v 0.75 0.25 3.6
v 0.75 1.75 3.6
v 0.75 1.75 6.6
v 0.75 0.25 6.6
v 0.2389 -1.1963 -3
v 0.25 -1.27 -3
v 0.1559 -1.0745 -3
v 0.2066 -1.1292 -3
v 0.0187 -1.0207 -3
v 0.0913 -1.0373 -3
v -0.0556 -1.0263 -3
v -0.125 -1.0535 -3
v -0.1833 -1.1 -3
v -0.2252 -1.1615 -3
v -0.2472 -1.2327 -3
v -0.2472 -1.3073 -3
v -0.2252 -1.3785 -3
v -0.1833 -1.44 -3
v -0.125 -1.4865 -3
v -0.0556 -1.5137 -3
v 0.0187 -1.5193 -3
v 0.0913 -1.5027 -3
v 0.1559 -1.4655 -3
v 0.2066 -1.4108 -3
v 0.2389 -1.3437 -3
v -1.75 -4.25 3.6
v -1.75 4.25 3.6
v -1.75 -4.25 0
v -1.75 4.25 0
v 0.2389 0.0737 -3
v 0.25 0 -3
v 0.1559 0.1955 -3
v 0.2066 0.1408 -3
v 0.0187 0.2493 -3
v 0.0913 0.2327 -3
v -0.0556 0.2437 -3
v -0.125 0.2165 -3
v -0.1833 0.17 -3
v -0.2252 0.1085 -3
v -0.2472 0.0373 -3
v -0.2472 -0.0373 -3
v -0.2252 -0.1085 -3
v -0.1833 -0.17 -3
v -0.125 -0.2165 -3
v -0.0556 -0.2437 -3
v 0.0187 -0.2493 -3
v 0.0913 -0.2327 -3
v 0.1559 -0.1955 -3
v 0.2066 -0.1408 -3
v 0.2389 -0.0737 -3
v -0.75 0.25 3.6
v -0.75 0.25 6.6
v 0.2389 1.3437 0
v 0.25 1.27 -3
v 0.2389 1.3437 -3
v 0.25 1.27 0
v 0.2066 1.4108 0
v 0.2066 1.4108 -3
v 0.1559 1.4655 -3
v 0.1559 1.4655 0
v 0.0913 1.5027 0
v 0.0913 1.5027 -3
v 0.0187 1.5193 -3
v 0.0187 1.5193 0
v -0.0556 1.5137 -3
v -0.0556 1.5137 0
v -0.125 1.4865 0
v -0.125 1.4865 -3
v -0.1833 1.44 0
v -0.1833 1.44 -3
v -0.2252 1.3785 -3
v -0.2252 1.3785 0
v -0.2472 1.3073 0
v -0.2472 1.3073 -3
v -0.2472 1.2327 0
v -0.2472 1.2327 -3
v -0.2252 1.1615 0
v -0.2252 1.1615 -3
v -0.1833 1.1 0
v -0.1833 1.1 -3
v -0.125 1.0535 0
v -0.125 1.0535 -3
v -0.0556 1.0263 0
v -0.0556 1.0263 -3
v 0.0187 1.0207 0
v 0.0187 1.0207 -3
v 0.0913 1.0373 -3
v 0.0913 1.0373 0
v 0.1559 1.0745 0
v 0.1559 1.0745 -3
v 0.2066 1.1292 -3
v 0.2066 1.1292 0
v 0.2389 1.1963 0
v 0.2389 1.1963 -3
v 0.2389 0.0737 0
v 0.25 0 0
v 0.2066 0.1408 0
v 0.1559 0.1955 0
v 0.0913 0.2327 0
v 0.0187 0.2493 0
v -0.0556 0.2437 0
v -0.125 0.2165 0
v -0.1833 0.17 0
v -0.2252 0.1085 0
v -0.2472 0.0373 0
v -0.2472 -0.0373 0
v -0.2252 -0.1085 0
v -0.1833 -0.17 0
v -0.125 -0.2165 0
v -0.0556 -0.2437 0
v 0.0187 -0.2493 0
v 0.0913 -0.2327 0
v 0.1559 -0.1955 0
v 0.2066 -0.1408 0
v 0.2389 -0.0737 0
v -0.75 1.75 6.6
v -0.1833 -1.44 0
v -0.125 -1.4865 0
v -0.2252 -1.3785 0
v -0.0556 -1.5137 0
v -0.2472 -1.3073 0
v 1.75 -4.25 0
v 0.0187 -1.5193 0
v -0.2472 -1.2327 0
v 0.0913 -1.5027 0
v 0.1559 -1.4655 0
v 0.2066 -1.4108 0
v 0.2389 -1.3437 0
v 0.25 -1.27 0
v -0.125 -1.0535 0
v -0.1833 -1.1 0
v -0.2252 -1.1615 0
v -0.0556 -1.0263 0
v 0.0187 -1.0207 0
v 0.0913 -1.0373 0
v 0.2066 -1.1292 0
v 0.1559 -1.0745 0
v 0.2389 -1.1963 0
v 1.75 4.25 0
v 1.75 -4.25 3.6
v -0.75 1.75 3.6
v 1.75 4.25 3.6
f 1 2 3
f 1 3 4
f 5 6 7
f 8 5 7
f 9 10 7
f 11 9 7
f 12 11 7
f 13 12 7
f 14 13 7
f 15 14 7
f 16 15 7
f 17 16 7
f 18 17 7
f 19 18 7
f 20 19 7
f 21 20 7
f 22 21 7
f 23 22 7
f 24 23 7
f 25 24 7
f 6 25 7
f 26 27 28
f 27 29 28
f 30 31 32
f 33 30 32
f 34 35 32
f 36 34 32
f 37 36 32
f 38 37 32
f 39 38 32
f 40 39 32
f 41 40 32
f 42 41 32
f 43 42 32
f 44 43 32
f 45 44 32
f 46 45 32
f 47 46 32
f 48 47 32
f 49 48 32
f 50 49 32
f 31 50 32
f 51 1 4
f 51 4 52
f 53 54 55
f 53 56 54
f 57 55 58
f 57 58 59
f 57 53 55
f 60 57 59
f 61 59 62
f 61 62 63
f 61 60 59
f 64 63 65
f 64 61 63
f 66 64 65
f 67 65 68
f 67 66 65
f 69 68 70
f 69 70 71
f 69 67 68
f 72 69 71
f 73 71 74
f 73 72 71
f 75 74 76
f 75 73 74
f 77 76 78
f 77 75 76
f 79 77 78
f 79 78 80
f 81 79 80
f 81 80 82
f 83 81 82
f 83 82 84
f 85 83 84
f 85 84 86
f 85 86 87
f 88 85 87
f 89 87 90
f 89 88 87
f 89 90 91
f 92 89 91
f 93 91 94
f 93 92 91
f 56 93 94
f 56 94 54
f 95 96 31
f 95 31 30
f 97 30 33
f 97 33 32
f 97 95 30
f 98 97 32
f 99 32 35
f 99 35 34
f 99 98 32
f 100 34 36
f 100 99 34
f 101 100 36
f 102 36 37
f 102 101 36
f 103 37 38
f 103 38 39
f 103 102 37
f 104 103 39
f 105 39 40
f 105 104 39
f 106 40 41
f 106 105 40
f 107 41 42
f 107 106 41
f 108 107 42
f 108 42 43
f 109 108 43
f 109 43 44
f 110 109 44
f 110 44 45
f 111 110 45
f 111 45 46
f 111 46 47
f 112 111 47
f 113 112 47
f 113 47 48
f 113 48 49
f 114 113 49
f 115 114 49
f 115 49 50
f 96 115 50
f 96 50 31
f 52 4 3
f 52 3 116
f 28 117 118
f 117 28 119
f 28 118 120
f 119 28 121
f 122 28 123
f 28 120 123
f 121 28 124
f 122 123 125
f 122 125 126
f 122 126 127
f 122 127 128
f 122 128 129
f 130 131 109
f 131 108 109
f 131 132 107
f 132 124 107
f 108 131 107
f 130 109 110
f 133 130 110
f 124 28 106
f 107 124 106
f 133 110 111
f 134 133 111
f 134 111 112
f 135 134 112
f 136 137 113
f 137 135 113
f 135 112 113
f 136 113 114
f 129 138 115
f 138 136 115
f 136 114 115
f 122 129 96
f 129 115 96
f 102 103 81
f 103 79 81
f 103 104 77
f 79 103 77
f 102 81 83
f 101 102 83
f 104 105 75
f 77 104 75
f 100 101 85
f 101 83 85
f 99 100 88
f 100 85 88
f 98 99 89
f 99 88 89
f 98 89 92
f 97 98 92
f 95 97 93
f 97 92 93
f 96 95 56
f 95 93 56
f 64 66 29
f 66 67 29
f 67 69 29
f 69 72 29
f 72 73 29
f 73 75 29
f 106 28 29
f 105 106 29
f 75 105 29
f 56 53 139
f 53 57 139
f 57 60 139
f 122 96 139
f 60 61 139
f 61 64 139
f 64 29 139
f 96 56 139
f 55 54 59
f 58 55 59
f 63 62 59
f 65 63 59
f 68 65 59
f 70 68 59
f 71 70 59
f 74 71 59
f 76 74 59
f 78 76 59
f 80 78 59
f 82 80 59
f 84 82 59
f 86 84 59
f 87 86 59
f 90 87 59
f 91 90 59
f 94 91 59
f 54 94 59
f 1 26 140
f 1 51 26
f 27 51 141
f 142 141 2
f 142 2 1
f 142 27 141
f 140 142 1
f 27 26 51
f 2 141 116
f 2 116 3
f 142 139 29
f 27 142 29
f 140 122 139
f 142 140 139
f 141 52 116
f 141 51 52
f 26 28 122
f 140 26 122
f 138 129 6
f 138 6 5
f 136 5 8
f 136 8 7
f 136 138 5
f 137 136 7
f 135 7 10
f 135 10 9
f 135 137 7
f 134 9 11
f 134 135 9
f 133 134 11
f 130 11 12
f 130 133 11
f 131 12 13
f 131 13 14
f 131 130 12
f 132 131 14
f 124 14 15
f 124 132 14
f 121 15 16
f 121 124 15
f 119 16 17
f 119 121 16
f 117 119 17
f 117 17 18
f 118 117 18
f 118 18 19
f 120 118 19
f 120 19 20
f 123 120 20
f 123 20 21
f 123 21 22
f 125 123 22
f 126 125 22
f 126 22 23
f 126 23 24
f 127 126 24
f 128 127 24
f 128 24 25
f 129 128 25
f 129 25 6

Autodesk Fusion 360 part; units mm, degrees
sketch "スケッチ1" plane through (0, 0, 0) normal (0, 0, 1) x (1, 0, 0)
  line L0 (-1.75, -4.25) -> (1.75, -4.25)
  line L1 (1.75, -4.25) -> (1.75, 4.25)
  line L2 (1.75, 4.25) -> (-1.75, 4.25)
  line L3 (-1.75, 4.25) -> (-1.75, -4.25)
  line L4 (0, 1.75) -> (0, 22.5)
  line L5 (1.75, 0) -> (22.5, 0)
  circle A0 centre (0, 0) radius 0.25
  dimension "d1" = 3.5
  dimension "d2" = 8.5
  dimension "d9" = 0.5
extrude "押し出し1" add sketch "スケッチ1" along normal blind 3.6 contours L0 L1 L2 L3 | A0
sketch "スケッチ2" plane through (0, 0, 3.6) normal (0, 0, 1) x (-1, 0, 0)
  line L0 (1.75, -4.25) -> (1.75, 4.25)
  line L1 (1.75, 4.25) -> (-1.75, 4.25)
  line L2 (-1.75, 4.25) -> (-1.75, -4.25)
  line L3 (-1.75, -4.25) -> (1.75, -4.25)
  line L4 (0.75, -1.75) -> (-0.75, -1.75)
  line L5 (-0.75, -1.75) -> (-0.75, -0.25)
  line L6 (-0.75, -0.25) -> (0.75, -0.25)
  line L7 (0.75, -0.25) -> (0.75, -1.75)
  line L8 (-1.75, 0) -> (-22.5, 0)
  line L9 (0, -1.75) -> (0, -22.5)
  dimension "d5" = 1.5
  dimension "d6" = 1.5
  dimension "d16" = 1.75
extrude "押し出し2" add sketch "スケッチ2" along normal blind 3 contours L4 L5 L6 L7
extrude "押し出し3" add sketch "スケッチ1" against normal blind 3 contours A0
pattern_linear "R パターン1" count 3 spacing 2.54 along (0, -1, 0) both ways of "押し出し3"
